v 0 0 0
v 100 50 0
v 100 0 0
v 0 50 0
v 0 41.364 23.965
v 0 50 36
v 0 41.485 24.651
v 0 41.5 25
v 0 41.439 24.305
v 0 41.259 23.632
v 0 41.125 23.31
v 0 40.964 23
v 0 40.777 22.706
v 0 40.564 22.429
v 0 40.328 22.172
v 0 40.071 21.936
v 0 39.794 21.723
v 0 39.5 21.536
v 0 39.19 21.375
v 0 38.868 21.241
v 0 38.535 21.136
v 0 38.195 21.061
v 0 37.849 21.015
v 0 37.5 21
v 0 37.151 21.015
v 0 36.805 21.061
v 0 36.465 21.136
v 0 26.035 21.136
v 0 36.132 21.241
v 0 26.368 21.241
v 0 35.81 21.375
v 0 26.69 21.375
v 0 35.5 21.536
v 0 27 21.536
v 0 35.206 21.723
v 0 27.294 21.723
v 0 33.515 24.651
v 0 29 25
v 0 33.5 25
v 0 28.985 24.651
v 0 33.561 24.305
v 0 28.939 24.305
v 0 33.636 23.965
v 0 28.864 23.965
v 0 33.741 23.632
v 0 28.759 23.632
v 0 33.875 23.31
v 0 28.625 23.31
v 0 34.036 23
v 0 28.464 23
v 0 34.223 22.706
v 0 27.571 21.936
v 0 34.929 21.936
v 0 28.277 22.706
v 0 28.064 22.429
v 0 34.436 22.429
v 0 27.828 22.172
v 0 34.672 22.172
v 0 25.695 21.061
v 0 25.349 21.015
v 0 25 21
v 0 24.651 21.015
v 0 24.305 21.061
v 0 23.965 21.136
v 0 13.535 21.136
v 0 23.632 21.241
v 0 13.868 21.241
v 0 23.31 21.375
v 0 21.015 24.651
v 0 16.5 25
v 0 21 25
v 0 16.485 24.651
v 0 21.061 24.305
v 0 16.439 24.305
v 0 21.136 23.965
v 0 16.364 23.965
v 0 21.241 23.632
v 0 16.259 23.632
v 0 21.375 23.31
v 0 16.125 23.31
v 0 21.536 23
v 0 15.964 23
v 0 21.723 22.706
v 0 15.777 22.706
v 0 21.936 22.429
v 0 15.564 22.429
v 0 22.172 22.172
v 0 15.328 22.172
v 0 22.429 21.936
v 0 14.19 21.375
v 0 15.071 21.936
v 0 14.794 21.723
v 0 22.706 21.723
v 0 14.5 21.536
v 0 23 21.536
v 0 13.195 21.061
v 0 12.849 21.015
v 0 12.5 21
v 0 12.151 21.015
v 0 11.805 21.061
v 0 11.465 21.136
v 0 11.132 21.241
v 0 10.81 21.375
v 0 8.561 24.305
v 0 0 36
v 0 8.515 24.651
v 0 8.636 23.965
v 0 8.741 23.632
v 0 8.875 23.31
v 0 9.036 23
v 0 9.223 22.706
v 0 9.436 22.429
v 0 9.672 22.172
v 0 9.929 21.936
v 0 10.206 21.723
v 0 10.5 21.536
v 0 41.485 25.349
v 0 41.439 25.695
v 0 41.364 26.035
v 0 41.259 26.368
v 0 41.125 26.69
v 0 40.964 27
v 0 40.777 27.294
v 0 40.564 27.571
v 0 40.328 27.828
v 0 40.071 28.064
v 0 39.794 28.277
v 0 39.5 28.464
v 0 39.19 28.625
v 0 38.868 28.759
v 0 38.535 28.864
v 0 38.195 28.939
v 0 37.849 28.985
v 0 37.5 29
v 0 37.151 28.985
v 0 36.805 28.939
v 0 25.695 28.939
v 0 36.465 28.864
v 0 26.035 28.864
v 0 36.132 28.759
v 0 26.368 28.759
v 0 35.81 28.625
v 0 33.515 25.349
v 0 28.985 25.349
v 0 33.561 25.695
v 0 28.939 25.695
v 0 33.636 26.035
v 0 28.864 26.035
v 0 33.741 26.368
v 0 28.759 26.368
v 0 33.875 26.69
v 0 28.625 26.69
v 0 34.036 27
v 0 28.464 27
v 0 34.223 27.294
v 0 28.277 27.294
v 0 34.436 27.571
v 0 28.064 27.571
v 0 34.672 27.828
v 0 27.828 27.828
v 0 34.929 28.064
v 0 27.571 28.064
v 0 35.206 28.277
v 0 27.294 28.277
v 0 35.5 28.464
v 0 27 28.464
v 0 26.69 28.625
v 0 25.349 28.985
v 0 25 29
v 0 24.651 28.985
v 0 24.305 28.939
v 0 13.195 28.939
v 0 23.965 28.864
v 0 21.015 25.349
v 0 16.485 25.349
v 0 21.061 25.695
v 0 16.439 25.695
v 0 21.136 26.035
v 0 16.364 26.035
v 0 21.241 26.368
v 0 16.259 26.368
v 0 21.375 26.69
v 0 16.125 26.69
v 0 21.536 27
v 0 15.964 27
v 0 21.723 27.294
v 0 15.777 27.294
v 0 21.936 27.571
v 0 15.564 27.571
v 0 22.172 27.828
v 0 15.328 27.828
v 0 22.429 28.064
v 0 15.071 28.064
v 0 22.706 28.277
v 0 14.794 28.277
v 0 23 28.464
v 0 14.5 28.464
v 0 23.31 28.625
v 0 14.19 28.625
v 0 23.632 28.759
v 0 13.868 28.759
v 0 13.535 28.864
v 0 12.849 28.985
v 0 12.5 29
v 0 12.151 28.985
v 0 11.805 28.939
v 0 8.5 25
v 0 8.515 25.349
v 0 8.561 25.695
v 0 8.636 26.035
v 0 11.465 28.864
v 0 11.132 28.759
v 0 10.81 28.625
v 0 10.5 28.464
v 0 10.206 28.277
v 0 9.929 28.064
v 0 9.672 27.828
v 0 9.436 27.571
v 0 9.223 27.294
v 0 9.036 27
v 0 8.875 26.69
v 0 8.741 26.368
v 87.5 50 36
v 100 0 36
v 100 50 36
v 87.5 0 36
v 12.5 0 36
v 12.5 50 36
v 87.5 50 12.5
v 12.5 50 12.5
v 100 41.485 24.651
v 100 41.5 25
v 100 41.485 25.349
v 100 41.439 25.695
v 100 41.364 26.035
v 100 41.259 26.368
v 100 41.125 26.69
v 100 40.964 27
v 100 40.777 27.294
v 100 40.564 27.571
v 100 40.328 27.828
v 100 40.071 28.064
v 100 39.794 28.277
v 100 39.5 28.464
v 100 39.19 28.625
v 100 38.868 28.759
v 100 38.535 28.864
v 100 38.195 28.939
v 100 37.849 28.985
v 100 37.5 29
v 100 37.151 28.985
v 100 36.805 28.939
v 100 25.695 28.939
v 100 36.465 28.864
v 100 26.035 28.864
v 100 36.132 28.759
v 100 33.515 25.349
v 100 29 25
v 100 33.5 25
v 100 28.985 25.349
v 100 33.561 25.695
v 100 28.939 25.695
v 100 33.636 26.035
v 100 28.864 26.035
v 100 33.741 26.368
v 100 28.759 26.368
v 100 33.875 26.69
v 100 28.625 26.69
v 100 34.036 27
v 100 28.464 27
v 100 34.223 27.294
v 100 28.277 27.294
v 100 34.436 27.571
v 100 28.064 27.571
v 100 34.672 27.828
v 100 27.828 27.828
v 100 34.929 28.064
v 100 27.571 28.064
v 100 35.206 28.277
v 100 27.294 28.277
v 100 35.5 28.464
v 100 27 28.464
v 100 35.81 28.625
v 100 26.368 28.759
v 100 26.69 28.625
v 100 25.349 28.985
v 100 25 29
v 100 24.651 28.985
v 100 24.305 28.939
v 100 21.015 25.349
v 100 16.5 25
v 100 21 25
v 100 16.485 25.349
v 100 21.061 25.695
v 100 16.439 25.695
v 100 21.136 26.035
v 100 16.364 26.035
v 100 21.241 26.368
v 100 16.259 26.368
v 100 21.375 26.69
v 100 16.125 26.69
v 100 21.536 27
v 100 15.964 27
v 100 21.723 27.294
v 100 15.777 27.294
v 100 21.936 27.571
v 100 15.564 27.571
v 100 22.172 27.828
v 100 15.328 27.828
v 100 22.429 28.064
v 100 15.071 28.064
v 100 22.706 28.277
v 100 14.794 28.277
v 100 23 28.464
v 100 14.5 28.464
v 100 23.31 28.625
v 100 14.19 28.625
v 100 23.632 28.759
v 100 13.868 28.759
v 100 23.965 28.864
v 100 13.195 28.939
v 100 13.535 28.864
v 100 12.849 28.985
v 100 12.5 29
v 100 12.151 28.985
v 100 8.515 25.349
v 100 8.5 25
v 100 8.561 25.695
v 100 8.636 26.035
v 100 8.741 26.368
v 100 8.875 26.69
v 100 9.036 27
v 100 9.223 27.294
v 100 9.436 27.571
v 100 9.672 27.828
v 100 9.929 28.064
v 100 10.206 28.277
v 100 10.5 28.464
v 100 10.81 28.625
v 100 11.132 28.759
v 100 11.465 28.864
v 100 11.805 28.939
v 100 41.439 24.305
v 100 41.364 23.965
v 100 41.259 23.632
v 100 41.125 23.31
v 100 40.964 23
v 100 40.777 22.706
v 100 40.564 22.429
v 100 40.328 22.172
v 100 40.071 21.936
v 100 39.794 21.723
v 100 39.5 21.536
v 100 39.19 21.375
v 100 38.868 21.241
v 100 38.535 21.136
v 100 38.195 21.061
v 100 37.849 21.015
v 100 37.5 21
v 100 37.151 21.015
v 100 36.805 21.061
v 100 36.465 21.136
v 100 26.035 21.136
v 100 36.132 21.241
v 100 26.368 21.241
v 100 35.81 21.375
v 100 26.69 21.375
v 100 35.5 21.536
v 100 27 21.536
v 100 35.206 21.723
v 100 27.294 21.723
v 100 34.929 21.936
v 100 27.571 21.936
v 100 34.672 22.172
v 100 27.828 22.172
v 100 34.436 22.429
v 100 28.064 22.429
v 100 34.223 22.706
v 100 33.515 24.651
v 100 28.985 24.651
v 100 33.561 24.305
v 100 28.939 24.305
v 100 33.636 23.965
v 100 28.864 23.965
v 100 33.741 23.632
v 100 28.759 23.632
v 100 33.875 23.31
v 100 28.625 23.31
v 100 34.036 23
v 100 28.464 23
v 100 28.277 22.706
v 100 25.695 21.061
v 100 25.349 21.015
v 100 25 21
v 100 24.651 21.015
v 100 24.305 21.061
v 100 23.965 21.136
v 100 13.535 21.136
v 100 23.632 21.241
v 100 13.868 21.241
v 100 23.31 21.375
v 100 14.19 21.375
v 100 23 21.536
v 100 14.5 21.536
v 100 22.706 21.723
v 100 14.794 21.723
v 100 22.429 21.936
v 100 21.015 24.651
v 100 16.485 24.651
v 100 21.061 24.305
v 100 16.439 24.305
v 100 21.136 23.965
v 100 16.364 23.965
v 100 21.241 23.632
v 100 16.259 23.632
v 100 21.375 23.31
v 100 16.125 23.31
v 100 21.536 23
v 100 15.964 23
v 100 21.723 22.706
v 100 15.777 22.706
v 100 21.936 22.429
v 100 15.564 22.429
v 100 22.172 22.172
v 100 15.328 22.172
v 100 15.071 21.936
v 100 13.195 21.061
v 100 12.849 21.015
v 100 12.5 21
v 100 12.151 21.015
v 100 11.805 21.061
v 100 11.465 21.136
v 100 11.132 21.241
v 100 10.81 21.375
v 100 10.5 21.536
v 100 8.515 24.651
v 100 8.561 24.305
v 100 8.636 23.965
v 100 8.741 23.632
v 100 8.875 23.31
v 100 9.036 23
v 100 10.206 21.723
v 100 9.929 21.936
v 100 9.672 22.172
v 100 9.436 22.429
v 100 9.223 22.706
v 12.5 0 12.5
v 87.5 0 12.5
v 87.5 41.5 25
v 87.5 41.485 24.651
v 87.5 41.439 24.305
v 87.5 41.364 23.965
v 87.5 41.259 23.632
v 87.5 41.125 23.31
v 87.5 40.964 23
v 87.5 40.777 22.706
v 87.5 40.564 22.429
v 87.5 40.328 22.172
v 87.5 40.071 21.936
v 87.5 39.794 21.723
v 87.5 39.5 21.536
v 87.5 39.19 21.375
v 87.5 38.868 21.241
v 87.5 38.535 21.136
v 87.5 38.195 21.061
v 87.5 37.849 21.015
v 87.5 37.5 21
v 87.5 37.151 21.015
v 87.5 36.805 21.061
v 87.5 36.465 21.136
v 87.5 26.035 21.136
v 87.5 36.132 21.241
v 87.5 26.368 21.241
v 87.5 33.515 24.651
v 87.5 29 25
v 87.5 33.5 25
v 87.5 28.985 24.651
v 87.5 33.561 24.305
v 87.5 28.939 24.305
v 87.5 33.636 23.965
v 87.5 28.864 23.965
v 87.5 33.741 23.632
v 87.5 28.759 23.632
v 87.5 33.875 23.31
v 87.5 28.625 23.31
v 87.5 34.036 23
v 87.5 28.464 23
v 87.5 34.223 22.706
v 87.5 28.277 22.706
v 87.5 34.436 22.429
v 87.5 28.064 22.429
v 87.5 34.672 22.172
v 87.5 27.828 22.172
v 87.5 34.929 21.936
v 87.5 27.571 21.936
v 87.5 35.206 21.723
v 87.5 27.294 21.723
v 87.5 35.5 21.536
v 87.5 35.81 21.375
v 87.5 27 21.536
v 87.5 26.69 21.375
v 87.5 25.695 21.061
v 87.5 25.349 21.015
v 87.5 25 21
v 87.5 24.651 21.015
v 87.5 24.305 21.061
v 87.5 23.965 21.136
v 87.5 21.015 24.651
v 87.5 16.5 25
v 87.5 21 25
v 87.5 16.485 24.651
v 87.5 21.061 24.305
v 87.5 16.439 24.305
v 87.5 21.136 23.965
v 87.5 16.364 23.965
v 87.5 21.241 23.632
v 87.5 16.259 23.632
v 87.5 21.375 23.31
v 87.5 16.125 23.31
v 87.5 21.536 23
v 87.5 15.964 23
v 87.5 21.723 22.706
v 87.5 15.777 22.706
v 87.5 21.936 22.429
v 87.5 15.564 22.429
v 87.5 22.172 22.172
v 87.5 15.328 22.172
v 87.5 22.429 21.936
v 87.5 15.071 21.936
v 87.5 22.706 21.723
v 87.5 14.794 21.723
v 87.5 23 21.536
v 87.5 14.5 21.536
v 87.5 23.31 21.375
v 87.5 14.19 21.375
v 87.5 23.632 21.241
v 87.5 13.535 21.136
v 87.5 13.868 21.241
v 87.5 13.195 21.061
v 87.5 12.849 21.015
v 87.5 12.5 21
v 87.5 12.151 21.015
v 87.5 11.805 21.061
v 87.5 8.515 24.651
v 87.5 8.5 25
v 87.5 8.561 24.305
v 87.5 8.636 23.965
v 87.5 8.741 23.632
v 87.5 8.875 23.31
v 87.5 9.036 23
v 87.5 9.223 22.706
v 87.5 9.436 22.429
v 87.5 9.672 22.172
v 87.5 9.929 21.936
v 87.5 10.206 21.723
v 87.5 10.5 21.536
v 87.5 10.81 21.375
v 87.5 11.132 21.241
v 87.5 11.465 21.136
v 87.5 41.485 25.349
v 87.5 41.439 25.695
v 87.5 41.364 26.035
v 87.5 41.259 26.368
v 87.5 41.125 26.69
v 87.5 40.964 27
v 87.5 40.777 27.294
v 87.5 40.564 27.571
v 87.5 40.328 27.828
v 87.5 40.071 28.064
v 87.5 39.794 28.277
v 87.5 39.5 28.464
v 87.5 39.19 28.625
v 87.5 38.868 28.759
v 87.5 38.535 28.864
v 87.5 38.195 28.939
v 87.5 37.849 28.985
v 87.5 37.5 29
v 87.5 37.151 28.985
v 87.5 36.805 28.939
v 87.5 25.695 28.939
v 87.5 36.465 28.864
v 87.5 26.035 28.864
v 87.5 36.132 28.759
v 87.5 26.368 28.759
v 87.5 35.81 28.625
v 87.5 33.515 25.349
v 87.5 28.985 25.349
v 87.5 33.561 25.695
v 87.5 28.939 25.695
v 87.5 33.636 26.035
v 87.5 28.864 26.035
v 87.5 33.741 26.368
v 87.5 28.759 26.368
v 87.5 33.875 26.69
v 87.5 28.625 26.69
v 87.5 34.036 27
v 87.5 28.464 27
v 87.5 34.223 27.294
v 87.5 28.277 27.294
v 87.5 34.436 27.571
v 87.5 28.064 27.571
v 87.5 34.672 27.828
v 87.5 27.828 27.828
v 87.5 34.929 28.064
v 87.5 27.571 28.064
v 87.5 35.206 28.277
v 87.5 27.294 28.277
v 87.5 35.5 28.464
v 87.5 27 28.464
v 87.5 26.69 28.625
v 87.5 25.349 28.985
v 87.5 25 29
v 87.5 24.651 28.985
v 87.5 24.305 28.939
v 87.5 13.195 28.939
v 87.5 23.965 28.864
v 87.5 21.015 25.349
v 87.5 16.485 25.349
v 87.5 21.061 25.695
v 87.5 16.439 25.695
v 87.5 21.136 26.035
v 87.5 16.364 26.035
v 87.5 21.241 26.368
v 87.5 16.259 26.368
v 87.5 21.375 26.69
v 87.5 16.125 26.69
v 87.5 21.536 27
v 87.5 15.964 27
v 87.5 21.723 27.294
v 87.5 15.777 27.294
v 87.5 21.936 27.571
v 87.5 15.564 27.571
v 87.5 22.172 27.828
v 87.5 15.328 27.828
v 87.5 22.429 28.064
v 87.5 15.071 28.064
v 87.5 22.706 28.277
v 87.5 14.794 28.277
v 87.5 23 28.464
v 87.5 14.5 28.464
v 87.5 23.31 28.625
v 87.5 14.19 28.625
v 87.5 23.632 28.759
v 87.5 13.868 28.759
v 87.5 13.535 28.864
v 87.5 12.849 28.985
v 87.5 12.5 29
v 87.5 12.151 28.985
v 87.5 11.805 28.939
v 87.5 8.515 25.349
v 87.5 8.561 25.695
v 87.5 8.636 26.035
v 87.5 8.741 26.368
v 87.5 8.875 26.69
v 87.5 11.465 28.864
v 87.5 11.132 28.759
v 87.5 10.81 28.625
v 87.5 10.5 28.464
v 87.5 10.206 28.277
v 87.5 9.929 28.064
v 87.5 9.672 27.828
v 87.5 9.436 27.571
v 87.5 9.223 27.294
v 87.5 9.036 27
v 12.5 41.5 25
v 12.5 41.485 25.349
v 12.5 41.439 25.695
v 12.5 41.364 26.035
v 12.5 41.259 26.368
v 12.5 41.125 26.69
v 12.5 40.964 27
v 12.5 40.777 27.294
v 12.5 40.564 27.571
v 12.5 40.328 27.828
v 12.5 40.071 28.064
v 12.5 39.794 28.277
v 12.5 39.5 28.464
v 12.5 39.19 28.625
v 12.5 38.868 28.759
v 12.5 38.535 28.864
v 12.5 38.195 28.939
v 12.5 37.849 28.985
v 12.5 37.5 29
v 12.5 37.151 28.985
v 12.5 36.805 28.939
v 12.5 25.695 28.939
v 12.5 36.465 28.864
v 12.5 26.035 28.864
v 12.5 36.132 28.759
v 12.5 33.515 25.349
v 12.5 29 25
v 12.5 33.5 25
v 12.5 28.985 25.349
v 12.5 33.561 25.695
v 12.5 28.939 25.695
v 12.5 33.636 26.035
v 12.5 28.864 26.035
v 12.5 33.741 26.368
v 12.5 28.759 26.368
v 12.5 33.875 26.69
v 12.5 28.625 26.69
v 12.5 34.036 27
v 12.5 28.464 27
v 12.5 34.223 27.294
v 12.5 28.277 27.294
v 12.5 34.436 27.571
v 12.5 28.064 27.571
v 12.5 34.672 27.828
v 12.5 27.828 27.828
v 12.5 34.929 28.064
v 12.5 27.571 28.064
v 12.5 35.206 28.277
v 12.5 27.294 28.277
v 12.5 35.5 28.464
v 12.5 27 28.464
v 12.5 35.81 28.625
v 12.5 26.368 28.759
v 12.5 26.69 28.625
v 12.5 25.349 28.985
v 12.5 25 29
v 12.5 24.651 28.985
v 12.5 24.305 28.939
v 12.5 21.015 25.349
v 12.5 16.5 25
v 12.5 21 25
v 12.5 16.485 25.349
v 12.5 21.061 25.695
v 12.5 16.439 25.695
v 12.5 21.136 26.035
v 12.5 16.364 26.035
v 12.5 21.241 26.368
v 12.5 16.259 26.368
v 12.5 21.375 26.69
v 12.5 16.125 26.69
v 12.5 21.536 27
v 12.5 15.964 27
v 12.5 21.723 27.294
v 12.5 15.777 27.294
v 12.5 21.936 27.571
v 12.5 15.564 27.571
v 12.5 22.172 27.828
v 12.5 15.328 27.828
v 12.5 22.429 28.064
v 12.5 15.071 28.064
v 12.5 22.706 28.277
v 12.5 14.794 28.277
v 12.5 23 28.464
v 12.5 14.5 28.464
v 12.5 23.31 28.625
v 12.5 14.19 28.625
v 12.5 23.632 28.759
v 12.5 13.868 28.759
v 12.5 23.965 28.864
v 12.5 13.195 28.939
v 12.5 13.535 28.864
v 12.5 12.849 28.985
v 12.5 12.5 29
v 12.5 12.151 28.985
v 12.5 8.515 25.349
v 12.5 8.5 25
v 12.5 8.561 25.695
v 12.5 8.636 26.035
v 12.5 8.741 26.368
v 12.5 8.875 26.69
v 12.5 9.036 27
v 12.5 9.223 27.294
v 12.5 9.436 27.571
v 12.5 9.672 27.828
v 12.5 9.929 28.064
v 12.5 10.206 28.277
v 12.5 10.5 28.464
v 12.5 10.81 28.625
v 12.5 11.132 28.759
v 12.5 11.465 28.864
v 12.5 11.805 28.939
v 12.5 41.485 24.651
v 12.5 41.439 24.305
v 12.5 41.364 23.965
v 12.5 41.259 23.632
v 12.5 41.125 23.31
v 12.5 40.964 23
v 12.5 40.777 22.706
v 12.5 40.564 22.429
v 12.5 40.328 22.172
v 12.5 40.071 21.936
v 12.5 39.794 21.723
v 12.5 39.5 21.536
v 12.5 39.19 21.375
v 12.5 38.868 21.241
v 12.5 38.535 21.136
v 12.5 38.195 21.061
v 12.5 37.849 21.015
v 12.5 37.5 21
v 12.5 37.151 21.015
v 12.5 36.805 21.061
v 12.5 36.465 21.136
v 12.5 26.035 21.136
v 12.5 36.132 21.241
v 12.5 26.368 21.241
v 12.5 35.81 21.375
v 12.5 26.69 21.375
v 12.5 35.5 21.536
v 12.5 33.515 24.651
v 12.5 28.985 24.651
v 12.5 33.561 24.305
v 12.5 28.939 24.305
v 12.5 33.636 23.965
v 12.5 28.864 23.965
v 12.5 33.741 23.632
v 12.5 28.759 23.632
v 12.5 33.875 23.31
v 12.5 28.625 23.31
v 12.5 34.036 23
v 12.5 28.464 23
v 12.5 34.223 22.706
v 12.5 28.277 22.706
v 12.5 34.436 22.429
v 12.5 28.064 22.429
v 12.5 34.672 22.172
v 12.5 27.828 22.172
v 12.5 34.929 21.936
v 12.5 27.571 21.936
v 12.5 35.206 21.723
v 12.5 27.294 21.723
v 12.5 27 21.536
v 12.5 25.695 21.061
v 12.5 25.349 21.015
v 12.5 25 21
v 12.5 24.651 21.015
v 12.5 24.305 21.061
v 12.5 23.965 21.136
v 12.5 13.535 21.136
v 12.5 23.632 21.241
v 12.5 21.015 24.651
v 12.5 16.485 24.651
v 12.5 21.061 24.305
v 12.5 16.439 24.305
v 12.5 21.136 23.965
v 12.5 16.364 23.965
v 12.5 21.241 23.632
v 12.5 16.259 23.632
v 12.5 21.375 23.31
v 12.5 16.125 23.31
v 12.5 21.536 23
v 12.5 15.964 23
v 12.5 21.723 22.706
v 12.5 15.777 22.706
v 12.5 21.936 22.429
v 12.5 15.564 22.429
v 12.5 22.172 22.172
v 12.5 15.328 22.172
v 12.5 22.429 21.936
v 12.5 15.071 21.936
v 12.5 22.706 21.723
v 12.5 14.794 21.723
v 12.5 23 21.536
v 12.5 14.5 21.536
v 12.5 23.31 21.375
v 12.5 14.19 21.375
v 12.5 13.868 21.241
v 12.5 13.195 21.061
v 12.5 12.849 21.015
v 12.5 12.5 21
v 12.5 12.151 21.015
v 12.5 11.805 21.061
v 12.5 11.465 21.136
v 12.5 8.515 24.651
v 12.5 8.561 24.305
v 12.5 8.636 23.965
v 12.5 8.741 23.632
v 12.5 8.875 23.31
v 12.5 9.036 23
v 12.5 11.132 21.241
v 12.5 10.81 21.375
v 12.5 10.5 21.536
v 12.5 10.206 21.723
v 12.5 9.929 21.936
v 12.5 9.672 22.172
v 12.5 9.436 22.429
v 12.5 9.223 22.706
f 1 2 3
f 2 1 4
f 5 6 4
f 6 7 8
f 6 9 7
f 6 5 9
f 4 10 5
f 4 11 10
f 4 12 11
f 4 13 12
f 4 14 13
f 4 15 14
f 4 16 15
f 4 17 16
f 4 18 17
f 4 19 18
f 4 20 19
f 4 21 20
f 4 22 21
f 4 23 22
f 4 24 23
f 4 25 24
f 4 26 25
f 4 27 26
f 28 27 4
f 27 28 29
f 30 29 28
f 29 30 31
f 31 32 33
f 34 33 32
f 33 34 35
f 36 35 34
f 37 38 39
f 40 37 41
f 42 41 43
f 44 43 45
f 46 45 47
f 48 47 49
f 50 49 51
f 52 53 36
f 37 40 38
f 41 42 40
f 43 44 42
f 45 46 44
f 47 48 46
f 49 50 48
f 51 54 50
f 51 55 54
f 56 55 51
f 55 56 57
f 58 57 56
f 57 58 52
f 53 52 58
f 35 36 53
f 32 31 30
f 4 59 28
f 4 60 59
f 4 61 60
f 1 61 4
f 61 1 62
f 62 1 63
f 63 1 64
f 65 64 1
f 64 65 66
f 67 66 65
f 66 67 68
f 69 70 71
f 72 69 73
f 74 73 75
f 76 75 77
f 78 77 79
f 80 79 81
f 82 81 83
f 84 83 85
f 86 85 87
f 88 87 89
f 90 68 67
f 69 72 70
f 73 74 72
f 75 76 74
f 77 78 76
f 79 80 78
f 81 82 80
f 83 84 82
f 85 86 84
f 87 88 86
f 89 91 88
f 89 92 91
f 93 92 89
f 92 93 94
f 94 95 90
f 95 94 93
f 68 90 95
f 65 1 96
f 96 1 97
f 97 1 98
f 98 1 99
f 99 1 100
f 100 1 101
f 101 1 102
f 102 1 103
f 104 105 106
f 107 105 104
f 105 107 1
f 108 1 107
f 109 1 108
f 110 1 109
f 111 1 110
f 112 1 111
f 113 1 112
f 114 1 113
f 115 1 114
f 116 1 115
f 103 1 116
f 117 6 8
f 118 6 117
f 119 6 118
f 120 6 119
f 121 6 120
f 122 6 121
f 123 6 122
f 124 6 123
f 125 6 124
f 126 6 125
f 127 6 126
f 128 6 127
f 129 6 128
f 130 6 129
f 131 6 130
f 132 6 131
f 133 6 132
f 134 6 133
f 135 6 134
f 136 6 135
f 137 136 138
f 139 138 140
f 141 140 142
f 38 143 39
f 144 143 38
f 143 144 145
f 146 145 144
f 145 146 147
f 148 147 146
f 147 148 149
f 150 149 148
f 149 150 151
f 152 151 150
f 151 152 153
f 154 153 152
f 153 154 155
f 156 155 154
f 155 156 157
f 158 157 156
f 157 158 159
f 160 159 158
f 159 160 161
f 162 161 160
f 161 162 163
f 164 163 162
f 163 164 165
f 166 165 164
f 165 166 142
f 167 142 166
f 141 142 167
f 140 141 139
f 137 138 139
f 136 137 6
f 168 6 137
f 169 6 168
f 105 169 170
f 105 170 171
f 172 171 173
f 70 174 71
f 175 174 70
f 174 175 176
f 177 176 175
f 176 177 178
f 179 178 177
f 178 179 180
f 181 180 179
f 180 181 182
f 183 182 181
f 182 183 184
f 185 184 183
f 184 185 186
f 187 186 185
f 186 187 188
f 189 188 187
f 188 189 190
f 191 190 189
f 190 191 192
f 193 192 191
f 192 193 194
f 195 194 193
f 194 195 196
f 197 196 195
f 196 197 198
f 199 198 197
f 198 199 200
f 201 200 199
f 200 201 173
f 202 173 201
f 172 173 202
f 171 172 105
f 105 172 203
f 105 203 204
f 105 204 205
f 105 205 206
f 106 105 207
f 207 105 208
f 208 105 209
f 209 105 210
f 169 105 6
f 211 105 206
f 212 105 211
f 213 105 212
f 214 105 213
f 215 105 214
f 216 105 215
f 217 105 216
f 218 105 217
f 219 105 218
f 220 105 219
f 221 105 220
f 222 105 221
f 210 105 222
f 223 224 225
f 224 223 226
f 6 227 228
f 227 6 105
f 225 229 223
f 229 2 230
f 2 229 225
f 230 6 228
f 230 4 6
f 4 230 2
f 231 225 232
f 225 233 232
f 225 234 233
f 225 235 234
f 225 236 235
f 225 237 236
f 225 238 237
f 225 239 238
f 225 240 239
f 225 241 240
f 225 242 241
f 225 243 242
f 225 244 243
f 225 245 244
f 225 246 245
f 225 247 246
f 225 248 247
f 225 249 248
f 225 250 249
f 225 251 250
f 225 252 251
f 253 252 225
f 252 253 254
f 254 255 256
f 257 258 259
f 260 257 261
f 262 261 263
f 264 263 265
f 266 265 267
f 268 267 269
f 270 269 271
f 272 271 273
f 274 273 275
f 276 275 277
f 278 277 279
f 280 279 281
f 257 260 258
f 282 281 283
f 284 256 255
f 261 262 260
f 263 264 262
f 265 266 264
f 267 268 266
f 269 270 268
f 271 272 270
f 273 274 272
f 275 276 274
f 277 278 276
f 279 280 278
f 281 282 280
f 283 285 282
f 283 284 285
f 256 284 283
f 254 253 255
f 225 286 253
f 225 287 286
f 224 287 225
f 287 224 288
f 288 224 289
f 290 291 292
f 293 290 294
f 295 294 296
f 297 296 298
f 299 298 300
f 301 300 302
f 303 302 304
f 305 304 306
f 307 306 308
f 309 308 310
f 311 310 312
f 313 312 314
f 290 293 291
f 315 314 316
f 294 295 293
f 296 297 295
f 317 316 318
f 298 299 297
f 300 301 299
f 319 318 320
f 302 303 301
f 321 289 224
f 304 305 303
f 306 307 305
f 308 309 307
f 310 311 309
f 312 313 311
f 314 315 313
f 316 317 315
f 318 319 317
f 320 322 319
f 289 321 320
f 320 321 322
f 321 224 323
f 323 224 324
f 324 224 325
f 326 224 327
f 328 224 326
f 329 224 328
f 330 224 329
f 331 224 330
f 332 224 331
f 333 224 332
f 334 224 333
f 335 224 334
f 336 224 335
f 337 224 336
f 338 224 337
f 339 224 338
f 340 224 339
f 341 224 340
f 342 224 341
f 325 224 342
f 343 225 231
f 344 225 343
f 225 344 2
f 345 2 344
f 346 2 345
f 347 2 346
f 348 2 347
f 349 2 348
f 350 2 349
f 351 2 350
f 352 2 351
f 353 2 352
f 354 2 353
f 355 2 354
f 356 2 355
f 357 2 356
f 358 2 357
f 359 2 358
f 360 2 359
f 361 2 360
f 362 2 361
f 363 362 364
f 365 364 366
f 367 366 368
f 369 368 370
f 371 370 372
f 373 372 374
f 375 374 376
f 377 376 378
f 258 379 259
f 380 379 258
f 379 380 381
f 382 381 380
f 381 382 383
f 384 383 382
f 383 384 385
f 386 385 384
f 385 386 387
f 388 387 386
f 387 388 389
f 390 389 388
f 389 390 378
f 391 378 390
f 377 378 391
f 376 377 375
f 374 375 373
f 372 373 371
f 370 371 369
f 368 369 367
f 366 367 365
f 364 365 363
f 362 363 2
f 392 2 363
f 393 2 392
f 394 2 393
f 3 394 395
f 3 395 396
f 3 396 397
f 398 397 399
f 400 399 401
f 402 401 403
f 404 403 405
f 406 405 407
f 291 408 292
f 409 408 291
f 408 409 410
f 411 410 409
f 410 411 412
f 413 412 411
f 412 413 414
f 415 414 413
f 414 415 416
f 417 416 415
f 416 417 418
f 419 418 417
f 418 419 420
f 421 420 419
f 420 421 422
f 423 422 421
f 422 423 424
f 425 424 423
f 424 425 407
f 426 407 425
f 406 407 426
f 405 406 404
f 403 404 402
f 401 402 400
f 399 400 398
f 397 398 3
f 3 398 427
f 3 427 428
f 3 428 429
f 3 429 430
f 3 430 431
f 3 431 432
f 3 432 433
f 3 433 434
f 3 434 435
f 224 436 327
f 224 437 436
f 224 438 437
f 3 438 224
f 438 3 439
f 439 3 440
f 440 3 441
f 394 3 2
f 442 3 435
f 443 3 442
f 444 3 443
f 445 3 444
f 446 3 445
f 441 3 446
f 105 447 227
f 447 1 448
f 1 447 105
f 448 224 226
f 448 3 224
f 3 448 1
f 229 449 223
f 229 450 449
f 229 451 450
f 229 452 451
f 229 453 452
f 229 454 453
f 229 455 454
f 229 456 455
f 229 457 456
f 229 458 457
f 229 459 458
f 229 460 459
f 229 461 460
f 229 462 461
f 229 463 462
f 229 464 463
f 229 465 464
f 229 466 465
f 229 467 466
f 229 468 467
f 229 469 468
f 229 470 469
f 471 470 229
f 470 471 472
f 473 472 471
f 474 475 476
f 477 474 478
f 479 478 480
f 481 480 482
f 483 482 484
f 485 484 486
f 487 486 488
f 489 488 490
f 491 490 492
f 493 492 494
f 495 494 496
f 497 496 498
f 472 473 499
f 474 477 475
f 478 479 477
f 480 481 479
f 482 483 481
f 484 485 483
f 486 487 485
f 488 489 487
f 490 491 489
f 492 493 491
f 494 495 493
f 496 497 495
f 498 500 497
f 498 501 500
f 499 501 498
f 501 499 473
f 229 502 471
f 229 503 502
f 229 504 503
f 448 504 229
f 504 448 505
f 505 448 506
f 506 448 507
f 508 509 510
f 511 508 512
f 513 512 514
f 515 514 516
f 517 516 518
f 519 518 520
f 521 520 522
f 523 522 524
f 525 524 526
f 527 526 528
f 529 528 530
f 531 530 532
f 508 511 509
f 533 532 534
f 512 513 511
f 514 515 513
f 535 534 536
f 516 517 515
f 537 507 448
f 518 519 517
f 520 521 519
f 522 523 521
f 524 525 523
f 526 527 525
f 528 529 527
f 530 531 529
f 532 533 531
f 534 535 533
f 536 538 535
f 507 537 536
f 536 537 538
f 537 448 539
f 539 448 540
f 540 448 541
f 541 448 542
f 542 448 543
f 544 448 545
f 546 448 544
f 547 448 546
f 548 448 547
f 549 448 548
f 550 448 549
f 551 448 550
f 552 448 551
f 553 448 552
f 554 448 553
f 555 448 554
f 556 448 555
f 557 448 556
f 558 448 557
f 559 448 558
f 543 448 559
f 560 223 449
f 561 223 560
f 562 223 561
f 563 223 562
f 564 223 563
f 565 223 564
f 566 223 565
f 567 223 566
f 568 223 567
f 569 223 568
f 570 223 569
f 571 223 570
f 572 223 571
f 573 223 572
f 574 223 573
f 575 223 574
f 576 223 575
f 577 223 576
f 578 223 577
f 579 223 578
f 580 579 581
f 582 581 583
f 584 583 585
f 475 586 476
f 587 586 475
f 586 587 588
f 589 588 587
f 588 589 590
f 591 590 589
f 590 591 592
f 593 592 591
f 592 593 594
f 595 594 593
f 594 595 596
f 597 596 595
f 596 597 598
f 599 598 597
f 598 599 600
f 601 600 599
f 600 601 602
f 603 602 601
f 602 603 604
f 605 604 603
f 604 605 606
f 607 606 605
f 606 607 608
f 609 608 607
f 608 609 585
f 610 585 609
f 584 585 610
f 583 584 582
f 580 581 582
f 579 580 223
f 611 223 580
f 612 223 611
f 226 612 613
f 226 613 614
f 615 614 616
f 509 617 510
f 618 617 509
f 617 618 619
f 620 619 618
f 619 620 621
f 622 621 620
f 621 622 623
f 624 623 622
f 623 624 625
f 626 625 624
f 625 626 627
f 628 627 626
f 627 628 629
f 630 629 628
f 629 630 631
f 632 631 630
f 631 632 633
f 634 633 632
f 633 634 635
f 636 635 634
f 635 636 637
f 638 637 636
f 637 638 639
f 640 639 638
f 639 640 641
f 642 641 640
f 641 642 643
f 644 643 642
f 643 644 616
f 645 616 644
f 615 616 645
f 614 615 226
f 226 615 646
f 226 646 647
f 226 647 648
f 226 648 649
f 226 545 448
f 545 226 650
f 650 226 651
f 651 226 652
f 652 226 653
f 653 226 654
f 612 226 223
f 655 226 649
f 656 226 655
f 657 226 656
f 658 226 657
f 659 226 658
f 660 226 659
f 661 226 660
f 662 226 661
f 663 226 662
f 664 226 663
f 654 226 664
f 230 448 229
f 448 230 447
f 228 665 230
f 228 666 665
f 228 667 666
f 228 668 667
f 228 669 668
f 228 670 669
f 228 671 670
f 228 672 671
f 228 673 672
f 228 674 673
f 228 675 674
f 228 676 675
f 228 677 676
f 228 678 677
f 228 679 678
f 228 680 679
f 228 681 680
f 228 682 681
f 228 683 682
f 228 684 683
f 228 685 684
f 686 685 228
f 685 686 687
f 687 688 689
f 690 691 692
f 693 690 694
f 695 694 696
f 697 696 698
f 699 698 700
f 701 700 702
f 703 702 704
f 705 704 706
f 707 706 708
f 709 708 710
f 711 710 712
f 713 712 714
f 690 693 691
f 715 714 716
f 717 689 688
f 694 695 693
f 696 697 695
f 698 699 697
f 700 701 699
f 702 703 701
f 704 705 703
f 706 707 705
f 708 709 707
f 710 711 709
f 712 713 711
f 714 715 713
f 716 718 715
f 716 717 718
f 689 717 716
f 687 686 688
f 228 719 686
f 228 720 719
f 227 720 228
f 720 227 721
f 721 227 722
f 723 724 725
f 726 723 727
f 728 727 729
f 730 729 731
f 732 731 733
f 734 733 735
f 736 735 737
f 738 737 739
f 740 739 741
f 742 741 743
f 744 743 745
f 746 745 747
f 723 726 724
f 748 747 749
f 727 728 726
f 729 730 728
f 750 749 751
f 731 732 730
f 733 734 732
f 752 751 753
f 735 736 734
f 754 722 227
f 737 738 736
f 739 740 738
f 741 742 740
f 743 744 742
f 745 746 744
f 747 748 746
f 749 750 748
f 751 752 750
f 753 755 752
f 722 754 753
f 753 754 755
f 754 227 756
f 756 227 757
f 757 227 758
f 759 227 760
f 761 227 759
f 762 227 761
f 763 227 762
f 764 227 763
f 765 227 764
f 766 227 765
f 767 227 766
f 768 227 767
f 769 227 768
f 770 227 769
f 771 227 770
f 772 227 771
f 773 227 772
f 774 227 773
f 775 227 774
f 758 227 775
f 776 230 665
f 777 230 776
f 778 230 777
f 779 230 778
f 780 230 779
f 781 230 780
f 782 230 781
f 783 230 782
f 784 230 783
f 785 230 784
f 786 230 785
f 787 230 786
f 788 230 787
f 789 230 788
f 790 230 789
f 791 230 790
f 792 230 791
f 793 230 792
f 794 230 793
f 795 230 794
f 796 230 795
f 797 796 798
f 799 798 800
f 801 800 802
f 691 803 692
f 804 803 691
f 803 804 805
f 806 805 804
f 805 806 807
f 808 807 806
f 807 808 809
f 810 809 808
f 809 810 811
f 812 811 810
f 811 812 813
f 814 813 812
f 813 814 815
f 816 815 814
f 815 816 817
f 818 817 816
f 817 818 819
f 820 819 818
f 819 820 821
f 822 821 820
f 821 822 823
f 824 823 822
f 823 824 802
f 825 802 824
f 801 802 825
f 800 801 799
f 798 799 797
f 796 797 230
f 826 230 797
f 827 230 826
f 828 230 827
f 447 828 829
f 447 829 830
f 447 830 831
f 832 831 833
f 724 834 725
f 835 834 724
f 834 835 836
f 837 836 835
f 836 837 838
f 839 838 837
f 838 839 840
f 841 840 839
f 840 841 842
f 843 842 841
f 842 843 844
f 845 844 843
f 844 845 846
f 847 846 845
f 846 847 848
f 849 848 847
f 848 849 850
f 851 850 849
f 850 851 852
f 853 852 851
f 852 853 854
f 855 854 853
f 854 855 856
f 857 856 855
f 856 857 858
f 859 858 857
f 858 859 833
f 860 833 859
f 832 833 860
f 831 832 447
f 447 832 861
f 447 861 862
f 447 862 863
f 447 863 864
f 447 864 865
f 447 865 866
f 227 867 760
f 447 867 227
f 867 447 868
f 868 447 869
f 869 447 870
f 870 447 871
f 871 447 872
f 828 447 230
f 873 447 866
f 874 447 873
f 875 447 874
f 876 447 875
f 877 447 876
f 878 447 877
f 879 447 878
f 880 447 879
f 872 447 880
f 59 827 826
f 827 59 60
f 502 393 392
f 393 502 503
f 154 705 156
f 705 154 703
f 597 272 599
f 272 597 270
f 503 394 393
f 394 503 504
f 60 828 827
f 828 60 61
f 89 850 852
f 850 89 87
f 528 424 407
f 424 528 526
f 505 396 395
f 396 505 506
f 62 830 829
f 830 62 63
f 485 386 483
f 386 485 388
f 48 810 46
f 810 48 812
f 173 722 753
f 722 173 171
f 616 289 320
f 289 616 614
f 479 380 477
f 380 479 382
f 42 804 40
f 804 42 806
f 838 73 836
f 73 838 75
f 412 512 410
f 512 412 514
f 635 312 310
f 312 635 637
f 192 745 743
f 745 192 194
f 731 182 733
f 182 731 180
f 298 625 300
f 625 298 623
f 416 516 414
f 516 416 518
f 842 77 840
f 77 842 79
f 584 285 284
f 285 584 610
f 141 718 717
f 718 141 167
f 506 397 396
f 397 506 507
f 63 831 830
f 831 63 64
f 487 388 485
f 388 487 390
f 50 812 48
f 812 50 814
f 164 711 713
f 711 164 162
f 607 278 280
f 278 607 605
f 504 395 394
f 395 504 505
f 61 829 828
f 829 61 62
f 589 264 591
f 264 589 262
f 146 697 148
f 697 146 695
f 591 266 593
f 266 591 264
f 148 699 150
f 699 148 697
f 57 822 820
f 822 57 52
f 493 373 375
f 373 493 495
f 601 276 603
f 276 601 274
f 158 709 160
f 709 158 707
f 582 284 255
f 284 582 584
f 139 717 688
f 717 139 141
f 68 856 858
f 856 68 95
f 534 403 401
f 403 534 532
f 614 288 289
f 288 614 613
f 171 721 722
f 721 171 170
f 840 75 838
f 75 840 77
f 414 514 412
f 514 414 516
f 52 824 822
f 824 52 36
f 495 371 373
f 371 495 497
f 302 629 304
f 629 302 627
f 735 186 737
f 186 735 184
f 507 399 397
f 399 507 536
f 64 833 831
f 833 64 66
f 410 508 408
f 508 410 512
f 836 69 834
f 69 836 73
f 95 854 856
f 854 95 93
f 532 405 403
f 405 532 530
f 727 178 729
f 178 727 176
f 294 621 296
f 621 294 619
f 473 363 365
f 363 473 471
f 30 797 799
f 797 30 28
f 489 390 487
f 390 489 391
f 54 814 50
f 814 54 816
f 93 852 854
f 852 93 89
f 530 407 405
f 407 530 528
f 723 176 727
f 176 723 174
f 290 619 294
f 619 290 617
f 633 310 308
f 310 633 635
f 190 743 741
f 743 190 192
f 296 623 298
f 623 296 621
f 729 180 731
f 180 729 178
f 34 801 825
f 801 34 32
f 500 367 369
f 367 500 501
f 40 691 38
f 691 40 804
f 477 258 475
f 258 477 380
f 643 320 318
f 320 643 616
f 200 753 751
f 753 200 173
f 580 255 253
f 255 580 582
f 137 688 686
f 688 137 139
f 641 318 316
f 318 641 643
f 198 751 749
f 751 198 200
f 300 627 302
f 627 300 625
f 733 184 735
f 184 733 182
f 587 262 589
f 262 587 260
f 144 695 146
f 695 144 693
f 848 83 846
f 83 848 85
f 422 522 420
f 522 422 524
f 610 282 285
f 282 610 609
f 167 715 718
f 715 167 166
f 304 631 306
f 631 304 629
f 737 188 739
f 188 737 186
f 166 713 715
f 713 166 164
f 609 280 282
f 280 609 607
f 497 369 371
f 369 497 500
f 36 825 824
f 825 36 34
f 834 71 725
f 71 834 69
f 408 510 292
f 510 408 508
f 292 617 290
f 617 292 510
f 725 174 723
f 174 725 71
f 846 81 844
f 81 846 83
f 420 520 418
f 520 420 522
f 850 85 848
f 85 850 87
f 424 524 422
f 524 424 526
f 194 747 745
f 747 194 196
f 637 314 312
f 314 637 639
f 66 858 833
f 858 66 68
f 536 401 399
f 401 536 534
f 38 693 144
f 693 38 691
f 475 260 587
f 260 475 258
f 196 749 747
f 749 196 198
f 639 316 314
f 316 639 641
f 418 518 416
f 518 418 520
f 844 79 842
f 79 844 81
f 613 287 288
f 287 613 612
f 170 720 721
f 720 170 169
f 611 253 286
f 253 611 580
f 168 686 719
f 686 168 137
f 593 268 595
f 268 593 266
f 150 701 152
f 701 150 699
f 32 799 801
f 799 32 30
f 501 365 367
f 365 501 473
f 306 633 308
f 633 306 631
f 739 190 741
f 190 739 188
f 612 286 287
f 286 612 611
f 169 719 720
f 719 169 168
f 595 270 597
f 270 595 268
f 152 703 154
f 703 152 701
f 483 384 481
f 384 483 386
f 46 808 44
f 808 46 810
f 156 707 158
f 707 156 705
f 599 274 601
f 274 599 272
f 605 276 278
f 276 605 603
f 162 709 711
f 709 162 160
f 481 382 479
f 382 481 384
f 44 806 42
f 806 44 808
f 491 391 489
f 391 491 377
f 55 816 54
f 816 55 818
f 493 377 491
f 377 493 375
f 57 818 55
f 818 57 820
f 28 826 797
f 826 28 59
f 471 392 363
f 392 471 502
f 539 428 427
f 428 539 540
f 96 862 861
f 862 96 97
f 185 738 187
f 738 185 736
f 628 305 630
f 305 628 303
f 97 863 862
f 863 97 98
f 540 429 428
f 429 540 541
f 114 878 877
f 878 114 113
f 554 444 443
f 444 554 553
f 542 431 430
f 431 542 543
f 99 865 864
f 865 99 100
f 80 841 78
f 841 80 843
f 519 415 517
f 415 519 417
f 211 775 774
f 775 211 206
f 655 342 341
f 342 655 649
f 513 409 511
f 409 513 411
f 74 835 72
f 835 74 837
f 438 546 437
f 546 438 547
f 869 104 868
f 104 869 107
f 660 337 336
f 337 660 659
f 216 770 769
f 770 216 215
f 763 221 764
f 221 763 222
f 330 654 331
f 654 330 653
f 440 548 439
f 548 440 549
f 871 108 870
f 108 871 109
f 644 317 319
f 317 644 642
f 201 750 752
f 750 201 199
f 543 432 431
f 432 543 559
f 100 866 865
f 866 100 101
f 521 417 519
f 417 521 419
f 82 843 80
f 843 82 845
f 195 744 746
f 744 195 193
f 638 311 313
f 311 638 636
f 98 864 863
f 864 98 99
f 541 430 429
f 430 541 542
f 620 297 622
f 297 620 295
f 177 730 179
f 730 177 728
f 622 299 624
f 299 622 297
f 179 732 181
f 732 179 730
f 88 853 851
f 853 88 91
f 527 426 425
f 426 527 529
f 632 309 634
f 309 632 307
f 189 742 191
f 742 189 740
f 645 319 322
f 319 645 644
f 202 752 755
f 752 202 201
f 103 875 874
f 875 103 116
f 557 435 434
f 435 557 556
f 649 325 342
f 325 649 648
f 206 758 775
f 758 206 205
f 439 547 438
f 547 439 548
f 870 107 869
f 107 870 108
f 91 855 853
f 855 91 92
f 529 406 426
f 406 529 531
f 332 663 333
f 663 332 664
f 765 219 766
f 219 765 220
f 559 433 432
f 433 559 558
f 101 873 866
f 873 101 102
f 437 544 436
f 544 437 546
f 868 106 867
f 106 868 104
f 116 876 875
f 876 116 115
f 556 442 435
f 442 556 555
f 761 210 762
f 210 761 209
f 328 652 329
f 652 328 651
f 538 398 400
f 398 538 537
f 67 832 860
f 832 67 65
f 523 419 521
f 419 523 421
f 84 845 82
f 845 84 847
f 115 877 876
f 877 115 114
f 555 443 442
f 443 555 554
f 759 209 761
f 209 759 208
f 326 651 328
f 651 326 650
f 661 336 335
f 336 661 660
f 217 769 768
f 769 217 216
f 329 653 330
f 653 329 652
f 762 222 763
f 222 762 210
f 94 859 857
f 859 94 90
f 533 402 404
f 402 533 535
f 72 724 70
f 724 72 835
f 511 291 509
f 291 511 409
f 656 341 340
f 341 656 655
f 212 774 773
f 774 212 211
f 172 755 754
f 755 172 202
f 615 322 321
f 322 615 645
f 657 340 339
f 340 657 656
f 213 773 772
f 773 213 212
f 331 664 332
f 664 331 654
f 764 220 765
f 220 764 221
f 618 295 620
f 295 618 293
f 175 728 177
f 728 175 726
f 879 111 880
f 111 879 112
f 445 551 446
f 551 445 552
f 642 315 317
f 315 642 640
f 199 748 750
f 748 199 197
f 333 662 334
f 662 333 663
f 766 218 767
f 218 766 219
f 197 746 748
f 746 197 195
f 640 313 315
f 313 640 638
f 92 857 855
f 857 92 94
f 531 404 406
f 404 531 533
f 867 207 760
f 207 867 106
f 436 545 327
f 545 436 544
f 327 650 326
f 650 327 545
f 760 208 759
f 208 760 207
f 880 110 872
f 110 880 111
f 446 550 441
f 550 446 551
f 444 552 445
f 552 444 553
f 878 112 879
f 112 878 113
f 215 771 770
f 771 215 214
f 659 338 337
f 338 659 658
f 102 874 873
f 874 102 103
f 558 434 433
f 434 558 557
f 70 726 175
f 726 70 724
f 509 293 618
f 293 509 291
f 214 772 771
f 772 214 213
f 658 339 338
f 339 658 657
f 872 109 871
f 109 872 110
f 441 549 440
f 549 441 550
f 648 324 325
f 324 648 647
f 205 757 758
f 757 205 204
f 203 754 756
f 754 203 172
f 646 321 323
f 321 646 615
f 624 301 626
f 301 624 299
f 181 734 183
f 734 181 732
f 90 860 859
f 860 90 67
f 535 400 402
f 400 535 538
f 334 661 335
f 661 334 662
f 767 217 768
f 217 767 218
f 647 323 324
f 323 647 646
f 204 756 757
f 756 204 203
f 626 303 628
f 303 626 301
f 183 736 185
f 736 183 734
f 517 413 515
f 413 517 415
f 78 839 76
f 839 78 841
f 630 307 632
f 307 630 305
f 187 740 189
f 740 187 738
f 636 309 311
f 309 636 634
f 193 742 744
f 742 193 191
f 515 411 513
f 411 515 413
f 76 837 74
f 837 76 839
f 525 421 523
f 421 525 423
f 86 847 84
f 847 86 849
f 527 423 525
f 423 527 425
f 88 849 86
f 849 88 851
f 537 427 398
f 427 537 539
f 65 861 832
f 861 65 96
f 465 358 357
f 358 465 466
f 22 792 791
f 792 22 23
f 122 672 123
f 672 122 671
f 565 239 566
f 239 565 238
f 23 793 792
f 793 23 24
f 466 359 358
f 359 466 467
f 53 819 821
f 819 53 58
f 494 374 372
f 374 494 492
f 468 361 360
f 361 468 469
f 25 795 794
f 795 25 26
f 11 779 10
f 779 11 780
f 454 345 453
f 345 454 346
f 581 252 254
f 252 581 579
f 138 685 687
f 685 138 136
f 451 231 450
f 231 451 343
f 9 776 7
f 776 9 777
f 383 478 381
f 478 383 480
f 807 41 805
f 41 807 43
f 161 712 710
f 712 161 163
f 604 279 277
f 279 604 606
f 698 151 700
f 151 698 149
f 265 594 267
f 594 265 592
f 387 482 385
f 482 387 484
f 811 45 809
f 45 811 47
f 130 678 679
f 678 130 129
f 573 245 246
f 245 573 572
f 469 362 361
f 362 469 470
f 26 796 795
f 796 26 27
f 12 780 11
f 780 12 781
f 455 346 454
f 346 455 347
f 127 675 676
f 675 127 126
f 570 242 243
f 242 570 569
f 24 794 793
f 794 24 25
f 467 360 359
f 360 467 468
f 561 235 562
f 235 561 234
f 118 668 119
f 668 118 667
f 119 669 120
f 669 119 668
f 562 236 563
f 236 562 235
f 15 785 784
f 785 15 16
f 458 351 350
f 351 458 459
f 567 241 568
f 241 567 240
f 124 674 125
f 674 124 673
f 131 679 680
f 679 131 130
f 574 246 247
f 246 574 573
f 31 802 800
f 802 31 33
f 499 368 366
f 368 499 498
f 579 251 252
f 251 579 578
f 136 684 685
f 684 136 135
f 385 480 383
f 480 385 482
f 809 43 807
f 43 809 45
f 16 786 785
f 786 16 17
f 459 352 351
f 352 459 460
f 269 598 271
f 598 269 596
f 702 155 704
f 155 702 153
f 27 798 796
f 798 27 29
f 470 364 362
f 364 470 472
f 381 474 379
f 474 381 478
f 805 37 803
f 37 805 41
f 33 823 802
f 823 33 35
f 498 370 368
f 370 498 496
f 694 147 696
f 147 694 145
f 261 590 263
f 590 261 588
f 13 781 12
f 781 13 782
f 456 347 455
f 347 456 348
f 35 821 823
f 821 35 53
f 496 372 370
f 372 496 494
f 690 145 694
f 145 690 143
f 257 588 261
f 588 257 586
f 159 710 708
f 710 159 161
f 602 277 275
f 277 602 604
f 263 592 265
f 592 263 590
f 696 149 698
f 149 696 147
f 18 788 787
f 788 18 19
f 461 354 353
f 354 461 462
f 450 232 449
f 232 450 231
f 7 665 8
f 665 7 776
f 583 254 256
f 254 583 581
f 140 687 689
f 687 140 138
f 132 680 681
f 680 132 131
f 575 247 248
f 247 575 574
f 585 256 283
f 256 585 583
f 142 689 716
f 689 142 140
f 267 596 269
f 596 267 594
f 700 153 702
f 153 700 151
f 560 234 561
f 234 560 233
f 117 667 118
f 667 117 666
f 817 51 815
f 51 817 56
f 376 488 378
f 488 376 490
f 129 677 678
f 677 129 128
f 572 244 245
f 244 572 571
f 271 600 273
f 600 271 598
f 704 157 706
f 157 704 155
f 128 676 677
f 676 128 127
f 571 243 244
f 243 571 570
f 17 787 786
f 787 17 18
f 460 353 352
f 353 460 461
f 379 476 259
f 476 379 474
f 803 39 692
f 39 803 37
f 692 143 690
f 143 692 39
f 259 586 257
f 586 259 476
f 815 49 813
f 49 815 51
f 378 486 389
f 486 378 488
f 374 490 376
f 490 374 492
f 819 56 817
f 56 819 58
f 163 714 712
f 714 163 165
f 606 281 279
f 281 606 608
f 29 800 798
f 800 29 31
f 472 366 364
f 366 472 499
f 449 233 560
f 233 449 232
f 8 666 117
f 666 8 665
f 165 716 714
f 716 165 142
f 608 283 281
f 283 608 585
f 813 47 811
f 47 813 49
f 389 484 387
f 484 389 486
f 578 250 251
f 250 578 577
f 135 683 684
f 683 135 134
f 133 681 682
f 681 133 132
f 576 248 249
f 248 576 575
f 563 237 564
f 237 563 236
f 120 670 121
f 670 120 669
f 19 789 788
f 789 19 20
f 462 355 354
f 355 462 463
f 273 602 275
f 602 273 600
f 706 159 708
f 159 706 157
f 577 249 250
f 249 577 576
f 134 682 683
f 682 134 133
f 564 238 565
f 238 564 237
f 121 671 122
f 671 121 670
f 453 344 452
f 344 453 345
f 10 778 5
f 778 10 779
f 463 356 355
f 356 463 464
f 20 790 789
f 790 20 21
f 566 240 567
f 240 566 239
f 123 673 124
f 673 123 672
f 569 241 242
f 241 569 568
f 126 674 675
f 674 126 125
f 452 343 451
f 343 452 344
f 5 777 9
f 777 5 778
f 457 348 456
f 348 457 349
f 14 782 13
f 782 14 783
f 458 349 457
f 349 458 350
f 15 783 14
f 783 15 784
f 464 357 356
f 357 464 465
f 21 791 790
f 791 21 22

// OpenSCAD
$fn = $preview ? 24 : 72;


// Vise Base Definitions.
// length, witdh, height, along with
// rails and method of linear advance
// (screw).

// constants
// this represents the minimum wall width around rails and screws.
safeZone = 4;

// dynamics (a.k.a. variables)
epsilon = 8;
viseLength = 100;
viseWidth = 50;
viseHeight = 36;

viseRailDiameter = 8;
viseAdvanceScrewDiameter = 8;




module base(viseLength, viseWidth, viseHeight, viseRailDiameter, viseAdvanceScrewDiameter) {
	wallThickness = viseLength/epsilon > 6 ? viseLength/epsilon : 10;

	difference() {
		linear_extrude(viseHeight) {
			square([viseLength,viseWidth]);
		}

		translate([viseLength-wallThickness,0,wallThickness]){
			rotate([0,-90,0]) {
				linear_extrude(viseLength-wallThickness-wallThickness) {
					square([(viseLength-wallThickness),viseWidth]);
				}
			}
		}

		translate([0,viseWidth/2,viseWidth/2]) {
			rotate([0,90,0]) {
				linear_extrude(viseLength) {
					circle(d=viseAdvanceScrewDiameter);
				}
			}
		}

		translate([0,viseWidth/4,viseWidth/2]) {
			rotate([0,90,0]) {
				linear_extrude(viseLength) {
					circle(d=viseRailDiameter);
				}
			}
		}

		translate([0,viseWidth/4*3,viseWidth/2]) {
			rotate([0,90,0]) {
				linear_extrude(viseLength) {
					circle(d=viseRailDiameter);
				}
			}
		}
	}
}

base(viseLength, viseWidth, viseHeight, viseRailDiameter, viseAdvanceScrewDiameter);
